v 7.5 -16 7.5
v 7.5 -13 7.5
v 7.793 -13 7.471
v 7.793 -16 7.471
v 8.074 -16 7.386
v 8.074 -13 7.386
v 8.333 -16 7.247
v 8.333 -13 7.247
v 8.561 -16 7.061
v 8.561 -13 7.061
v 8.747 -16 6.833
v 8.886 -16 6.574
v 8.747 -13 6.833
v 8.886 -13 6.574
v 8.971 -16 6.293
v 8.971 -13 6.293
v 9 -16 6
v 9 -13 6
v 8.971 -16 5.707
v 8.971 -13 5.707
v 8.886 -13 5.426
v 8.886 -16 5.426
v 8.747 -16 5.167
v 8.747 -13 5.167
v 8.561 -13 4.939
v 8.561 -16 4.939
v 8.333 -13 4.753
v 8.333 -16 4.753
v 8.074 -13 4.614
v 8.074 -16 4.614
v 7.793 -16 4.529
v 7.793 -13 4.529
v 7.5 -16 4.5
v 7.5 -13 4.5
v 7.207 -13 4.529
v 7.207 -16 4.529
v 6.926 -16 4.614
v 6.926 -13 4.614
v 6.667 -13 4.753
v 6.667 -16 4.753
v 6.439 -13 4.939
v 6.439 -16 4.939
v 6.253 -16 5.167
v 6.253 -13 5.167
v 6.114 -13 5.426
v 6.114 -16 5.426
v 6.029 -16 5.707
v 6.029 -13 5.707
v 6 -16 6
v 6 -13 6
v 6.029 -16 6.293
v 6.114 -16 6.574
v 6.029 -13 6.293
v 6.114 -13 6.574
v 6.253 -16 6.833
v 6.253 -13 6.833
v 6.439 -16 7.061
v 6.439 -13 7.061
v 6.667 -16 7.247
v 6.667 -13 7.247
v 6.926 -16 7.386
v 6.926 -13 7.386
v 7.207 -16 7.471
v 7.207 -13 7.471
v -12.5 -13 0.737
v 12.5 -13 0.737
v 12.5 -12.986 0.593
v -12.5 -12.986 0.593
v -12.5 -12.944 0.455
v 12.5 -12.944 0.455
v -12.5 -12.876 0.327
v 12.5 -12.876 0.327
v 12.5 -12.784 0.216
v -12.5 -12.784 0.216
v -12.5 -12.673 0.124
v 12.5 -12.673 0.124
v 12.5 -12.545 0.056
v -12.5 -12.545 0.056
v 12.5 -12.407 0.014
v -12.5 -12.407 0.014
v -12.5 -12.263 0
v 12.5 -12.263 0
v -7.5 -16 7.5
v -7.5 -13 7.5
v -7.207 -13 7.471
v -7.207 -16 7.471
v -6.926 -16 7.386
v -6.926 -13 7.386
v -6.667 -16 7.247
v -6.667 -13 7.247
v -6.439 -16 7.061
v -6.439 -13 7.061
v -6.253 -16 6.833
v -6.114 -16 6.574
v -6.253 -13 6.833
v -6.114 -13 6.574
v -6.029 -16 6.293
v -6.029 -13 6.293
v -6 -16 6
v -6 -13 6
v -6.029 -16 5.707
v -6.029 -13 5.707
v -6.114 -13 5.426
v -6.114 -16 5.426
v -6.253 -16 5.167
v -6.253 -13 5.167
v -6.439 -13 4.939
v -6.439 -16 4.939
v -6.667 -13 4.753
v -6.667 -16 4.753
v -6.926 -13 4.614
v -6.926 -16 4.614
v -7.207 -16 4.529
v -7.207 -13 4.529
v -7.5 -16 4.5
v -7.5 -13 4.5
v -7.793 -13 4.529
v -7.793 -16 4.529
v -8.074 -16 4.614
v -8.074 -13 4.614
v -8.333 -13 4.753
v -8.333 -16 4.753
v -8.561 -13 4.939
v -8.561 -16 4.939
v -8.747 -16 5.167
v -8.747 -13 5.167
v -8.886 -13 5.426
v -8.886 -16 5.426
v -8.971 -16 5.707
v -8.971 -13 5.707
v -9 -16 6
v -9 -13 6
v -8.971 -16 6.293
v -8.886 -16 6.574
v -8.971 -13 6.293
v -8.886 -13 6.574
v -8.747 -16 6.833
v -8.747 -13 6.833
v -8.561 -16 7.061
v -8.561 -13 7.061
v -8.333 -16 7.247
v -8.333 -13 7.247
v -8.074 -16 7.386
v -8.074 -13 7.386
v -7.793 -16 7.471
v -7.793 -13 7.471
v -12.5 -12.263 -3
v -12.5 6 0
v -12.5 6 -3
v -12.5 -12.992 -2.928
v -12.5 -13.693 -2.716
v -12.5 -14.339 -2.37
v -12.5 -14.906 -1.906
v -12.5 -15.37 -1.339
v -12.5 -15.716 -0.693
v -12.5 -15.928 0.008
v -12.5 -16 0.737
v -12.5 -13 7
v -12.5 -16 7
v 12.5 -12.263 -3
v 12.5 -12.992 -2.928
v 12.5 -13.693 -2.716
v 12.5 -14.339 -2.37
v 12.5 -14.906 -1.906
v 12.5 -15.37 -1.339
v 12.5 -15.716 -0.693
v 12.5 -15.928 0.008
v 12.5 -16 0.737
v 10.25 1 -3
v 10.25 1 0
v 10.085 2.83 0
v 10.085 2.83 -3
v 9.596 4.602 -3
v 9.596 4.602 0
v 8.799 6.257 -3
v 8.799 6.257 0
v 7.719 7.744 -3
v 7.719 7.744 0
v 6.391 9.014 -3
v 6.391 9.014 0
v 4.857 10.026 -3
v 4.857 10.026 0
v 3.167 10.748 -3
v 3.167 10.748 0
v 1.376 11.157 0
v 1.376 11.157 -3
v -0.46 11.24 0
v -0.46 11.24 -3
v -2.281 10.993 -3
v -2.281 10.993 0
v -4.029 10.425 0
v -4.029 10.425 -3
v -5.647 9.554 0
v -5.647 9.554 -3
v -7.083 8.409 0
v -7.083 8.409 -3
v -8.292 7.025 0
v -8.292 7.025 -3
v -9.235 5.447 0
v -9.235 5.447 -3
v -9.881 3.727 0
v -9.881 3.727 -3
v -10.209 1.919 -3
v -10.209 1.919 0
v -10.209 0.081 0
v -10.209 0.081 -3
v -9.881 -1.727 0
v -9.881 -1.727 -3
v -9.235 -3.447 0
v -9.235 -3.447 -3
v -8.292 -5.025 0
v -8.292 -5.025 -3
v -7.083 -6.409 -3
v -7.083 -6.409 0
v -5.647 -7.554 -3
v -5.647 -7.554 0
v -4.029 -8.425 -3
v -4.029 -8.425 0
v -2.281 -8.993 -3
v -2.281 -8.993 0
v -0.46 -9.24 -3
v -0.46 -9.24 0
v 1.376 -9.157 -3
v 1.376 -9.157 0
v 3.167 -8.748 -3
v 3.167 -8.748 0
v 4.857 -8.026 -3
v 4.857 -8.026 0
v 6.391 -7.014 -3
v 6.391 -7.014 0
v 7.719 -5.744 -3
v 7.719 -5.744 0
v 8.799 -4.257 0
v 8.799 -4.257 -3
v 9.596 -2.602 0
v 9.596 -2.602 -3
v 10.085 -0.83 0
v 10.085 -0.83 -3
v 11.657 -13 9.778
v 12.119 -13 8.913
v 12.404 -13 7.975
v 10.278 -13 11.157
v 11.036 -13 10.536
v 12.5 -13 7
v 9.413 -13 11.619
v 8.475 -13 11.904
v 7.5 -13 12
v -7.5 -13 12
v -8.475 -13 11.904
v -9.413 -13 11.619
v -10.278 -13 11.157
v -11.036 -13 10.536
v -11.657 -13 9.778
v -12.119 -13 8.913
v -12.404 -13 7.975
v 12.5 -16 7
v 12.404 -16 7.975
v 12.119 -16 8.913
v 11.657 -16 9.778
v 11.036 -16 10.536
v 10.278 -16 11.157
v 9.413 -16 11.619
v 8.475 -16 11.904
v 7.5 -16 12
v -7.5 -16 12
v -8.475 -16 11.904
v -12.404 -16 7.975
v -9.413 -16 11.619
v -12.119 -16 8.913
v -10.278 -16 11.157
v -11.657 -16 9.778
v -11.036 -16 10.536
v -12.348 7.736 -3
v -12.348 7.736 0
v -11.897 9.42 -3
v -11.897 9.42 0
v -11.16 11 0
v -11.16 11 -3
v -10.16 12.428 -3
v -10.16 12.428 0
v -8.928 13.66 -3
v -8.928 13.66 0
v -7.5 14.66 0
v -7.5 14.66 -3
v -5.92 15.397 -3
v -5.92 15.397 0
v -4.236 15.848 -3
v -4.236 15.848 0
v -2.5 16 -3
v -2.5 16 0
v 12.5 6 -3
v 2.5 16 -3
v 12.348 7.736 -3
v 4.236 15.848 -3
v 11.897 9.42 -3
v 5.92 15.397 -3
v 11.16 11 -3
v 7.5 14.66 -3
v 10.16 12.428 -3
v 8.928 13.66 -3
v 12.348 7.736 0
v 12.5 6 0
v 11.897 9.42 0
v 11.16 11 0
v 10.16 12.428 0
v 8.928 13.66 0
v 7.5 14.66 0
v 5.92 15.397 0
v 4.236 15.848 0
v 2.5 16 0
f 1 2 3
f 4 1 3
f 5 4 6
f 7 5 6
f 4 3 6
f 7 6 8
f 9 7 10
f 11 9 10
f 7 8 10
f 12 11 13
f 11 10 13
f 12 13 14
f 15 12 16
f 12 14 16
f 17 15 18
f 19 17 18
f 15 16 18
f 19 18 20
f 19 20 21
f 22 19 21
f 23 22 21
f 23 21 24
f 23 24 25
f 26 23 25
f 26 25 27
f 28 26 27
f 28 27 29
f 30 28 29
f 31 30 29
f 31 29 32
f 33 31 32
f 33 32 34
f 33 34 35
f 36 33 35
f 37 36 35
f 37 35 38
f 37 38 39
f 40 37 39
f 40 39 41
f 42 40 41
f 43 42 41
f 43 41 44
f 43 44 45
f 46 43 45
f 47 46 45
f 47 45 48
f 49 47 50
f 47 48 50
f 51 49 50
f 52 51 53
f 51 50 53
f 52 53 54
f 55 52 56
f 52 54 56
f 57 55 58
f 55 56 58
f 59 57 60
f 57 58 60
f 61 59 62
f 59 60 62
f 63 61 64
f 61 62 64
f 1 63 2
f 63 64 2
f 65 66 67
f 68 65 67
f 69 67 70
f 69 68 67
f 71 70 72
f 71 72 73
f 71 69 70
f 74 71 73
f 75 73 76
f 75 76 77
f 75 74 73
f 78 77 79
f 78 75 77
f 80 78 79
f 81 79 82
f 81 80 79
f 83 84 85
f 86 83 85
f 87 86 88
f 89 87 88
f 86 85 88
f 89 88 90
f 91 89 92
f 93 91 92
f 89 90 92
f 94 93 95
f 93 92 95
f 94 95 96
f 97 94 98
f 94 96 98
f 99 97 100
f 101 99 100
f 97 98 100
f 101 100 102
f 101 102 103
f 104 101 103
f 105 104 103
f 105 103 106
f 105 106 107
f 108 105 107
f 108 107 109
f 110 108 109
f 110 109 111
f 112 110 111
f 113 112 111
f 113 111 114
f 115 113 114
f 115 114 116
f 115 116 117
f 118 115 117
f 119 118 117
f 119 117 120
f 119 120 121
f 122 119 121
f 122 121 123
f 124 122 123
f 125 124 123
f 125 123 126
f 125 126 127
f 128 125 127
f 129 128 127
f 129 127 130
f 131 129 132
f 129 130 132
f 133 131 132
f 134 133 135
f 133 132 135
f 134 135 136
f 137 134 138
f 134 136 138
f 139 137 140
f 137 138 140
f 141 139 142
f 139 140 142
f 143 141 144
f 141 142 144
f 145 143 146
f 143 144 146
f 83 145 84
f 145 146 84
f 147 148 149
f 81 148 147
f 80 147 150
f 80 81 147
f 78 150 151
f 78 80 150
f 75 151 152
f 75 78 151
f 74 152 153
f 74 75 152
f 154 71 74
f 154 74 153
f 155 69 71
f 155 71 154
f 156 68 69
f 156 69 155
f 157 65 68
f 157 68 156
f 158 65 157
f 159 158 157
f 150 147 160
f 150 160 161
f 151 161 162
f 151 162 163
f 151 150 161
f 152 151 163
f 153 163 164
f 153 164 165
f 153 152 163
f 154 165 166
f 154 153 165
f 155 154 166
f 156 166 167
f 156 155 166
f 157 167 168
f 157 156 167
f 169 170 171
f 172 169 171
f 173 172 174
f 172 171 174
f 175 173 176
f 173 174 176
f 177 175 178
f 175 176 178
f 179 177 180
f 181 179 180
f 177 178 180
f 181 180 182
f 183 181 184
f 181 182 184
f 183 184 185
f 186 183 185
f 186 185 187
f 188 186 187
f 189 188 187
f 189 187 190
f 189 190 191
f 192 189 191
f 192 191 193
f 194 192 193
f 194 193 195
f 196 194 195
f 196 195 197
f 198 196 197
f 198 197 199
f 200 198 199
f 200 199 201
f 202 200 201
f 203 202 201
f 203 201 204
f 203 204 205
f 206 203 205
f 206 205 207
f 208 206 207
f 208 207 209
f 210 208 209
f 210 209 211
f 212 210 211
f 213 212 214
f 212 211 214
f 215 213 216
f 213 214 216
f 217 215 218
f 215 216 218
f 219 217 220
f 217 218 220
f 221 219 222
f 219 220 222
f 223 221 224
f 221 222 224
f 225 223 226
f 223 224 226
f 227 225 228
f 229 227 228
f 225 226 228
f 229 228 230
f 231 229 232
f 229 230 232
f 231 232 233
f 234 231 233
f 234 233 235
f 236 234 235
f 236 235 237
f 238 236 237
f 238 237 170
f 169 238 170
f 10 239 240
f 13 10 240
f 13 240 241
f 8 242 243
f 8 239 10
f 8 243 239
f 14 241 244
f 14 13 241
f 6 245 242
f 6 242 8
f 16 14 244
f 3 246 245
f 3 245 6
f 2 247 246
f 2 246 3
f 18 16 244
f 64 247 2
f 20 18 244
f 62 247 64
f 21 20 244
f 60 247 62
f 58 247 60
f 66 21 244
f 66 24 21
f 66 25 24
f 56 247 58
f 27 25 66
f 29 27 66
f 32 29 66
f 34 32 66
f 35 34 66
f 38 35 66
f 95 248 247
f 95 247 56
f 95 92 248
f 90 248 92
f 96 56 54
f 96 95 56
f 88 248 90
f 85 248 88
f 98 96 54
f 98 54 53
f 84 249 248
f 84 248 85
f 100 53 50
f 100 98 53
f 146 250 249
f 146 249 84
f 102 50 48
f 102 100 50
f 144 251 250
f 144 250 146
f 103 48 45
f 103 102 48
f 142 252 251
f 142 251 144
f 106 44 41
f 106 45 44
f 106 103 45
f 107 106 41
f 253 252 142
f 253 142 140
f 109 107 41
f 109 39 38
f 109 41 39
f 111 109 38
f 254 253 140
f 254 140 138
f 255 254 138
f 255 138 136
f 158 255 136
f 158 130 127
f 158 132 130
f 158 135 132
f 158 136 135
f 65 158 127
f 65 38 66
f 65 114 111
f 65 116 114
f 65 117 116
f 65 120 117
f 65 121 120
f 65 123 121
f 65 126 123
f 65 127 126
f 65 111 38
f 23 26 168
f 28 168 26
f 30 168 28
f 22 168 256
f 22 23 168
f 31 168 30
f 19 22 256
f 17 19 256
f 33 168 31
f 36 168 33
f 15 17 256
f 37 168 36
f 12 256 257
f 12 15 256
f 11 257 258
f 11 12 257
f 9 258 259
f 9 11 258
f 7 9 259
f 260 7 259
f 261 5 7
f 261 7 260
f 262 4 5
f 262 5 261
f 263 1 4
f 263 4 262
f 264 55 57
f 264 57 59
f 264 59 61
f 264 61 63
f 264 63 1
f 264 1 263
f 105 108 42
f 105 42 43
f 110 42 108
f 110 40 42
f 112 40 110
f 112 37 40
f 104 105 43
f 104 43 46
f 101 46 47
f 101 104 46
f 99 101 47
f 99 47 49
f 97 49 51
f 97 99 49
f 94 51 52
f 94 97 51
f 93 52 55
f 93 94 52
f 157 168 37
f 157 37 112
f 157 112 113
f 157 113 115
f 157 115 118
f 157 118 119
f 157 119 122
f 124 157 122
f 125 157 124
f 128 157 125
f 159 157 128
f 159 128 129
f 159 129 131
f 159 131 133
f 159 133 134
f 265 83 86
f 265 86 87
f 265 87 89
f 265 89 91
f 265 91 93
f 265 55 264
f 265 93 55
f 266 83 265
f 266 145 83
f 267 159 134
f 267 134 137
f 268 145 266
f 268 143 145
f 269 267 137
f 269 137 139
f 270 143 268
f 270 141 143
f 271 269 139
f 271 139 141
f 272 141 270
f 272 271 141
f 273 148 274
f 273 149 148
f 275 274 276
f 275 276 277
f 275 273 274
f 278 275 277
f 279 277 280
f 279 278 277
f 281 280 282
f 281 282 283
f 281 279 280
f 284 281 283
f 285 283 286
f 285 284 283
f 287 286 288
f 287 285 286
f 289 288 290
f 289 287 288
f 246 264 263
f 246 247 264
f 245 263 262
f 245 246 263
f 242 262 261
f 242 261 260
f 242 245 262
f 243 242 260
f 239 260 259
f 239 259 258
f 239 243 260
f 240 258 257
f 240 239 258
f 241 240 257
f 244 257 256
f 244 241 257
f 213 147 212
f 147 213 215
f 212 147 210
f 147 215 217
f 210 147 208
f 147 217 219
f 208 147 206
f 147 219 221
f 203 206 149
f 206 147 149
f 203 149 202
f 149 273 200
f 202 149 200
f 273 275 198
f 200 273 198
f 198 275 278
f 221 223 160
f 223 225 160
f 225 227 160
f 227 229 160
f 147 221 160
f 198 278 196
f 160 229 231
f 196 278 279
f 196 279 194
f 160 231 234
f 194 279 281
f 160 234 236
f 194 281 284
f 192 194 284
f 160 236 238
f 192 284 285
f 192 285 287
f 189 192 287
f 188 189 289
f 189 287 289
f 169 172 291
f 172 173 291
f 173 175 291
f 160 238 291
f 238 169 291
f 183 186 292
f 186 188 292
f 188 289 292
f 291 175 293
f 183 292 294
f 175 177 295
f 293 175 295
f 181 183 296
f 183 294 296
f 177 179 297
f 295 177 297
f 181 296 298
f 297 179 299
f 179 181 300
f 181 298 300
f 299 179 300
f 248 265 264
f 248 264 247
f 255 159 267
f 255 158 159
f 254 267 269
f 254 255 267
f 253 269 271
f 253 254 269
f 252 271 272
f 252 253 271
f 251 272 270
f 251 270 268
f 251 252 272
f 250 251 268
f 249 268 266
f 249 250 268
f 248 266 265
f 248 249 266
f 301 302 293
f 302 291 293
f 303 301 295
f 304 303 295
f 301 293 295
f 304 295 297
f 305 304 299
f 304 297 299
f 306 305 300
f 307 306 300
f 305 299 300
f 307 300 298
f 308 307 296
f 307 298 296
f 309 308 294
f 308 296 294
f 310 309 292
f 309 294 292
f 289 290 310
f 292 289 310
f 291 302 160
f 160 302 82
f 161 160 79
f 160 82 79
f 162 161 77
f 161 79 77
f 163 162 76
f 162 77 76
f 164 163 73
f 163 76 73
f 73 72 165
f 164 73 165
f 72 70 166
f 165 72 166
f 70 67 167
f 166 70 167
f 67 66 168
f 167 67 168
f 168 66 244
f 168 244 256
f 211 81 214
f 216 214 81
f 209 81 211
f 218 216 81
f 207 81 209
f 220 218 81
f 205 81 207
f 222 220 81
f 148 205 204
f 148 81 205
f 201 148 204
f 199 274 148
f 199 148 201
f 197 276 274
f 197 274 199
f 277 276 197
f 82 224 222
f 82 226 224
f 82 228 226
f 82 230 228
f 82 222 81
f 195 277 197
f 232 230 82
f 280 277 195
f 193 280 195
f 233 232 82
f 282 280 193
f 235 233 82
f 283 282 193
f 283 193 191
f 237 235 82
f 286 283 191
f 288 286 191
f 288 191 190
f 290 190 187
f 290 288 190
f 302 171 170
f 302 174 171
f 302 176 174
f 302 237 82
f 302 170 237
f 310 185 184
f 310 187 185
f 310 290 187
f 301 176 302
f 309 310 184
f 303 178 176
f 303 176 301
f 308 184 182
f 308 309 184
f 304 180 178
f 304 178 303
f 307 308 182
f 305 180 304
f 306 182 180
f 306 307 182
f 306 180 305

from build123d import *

# Parameters (mm, degrees)
SKETCH_1_W                       = 25
SKETCH_1_H                       = 32
SM_BASE_FLANGE_1_DEPTH           = 3
SM_EDGE_FLANGE_1_STRIP_W         = 13.4732
SM_EDGE_FLANGE_1_STRIP_H         = 3
SM_EDGE_FLANGE_1_STRIP_CUT_DEPTH = 25
SM_EDGE_FLANGE_1_DEPTH           = 25
SKETCH_13_R                      = 10.25
CUT_EXTRUDE_1_DEPTH              = 10
SKETCH_15_R                      = 1.5
CUT_EXTRUDE_2_DEPTH              = 10
FILLET_1_R                       = 10
FILLET_2_R                       = 5


# Sheet-metal steps are written as plain solids
with BuildPart() as part:
    # Sketch 1 → 基体-法兰1 (new body)
    with BuildSketch(Plane.XY):
        Rectangle(SKETCH_1_W, SKETCH_1_H)
    extrude(amount=-SM_BASE_FLANGE_1_DEPTH)

    # 边线-法兰1 strip (across the edge) → 边线-法兰1 strip cut (cut)
    with BuildSketch(Plane(origin=(-12.5, -16, 0), x_dir=(0, 1, 0), z_dir=(1, 0, 0))):
        with Locations((-3, -1.5)):
            Rectangle(SM_EDGE_FLANGE_1_STRIP_W, SM_EDGE_FLANGE_1_STRIP_H)
    extrude(amount=SM_EDGE_FLANGE_1_STRIP_CUT_DEPTH, mode=Mode.SUBTRACT)

    # 边线-法兰1 section (across the edge) → 边线-法兰1 (add)
    with BuildSketch(Plane(origin=(-12.5, -16, 0), x_dir=(0, 1, 0), z_dir=(1, 0, 0))):
        with BuildLine():
            Line((0, 0.7366), (0, 12))
            Line((0, 12), (3, 12))
            Line((3, 12), (3, 0.7366))
            ThreePointArc((3, 0.7366), (3.215745145, 0.215745145), (3.7366, 0))
            Line((3.7366, 0), (3.7366, -3))
            ThreePointArc((3.7366, -3), (1.094424801, -1.905575199), (0, 0.7366))
        make_face()
    extrude(amount=SM_EDGE_FLANGE_1_DEPTH)

    # 草图13 → 切除-拉伸1 (cut)
    with BuildSketch(Plane.XY):
        with Locations((0, 1)):
            Circle(SKETCH_13_R)
    extrude(amount=-CUT_EXTRUDE_1_DEPTH, mode=Mode.SUBTRACT)

    # 草图15 → 切除-拉伸2 (cut)
    with BuildSketch(Plane(origin=(0, -13, 0), x_dir=(1, 0, 0), z_dir=(0, 1, 0))):
        with Locations(Location((-7.5, -6, 0), (0, 0, 270))):
            Circle(SKETCH_15_R)
        with Locations(Location((7.5, -6, 0), (0, 0, 270))):
            Circle(SKETCH_15_R)
    extrude(amount=-CUT_EXTRUDE_2_DEPTH, mode=Mode.SUBTRACT)

    # 圆角1
    fillet_1_edges = [part.edges().sort_by_distance(p)[0] for p in [
        (-12.5, 16, -1.5),
        (12.5, 16, -1.5),
    ]]
    fillet(fillet_1_edges, radius=FILLET_1_R)

    # 圆角2
    fillet_2_edges = [part.edges().sort_by_distance(p)[0] for p in [
        (-12.5, -14.5, 12),
        (12.5, -14.5, 12),
    ]]
    fillet(fillet_2_edges, radius=FILLET_2_R)


solid = part.part
